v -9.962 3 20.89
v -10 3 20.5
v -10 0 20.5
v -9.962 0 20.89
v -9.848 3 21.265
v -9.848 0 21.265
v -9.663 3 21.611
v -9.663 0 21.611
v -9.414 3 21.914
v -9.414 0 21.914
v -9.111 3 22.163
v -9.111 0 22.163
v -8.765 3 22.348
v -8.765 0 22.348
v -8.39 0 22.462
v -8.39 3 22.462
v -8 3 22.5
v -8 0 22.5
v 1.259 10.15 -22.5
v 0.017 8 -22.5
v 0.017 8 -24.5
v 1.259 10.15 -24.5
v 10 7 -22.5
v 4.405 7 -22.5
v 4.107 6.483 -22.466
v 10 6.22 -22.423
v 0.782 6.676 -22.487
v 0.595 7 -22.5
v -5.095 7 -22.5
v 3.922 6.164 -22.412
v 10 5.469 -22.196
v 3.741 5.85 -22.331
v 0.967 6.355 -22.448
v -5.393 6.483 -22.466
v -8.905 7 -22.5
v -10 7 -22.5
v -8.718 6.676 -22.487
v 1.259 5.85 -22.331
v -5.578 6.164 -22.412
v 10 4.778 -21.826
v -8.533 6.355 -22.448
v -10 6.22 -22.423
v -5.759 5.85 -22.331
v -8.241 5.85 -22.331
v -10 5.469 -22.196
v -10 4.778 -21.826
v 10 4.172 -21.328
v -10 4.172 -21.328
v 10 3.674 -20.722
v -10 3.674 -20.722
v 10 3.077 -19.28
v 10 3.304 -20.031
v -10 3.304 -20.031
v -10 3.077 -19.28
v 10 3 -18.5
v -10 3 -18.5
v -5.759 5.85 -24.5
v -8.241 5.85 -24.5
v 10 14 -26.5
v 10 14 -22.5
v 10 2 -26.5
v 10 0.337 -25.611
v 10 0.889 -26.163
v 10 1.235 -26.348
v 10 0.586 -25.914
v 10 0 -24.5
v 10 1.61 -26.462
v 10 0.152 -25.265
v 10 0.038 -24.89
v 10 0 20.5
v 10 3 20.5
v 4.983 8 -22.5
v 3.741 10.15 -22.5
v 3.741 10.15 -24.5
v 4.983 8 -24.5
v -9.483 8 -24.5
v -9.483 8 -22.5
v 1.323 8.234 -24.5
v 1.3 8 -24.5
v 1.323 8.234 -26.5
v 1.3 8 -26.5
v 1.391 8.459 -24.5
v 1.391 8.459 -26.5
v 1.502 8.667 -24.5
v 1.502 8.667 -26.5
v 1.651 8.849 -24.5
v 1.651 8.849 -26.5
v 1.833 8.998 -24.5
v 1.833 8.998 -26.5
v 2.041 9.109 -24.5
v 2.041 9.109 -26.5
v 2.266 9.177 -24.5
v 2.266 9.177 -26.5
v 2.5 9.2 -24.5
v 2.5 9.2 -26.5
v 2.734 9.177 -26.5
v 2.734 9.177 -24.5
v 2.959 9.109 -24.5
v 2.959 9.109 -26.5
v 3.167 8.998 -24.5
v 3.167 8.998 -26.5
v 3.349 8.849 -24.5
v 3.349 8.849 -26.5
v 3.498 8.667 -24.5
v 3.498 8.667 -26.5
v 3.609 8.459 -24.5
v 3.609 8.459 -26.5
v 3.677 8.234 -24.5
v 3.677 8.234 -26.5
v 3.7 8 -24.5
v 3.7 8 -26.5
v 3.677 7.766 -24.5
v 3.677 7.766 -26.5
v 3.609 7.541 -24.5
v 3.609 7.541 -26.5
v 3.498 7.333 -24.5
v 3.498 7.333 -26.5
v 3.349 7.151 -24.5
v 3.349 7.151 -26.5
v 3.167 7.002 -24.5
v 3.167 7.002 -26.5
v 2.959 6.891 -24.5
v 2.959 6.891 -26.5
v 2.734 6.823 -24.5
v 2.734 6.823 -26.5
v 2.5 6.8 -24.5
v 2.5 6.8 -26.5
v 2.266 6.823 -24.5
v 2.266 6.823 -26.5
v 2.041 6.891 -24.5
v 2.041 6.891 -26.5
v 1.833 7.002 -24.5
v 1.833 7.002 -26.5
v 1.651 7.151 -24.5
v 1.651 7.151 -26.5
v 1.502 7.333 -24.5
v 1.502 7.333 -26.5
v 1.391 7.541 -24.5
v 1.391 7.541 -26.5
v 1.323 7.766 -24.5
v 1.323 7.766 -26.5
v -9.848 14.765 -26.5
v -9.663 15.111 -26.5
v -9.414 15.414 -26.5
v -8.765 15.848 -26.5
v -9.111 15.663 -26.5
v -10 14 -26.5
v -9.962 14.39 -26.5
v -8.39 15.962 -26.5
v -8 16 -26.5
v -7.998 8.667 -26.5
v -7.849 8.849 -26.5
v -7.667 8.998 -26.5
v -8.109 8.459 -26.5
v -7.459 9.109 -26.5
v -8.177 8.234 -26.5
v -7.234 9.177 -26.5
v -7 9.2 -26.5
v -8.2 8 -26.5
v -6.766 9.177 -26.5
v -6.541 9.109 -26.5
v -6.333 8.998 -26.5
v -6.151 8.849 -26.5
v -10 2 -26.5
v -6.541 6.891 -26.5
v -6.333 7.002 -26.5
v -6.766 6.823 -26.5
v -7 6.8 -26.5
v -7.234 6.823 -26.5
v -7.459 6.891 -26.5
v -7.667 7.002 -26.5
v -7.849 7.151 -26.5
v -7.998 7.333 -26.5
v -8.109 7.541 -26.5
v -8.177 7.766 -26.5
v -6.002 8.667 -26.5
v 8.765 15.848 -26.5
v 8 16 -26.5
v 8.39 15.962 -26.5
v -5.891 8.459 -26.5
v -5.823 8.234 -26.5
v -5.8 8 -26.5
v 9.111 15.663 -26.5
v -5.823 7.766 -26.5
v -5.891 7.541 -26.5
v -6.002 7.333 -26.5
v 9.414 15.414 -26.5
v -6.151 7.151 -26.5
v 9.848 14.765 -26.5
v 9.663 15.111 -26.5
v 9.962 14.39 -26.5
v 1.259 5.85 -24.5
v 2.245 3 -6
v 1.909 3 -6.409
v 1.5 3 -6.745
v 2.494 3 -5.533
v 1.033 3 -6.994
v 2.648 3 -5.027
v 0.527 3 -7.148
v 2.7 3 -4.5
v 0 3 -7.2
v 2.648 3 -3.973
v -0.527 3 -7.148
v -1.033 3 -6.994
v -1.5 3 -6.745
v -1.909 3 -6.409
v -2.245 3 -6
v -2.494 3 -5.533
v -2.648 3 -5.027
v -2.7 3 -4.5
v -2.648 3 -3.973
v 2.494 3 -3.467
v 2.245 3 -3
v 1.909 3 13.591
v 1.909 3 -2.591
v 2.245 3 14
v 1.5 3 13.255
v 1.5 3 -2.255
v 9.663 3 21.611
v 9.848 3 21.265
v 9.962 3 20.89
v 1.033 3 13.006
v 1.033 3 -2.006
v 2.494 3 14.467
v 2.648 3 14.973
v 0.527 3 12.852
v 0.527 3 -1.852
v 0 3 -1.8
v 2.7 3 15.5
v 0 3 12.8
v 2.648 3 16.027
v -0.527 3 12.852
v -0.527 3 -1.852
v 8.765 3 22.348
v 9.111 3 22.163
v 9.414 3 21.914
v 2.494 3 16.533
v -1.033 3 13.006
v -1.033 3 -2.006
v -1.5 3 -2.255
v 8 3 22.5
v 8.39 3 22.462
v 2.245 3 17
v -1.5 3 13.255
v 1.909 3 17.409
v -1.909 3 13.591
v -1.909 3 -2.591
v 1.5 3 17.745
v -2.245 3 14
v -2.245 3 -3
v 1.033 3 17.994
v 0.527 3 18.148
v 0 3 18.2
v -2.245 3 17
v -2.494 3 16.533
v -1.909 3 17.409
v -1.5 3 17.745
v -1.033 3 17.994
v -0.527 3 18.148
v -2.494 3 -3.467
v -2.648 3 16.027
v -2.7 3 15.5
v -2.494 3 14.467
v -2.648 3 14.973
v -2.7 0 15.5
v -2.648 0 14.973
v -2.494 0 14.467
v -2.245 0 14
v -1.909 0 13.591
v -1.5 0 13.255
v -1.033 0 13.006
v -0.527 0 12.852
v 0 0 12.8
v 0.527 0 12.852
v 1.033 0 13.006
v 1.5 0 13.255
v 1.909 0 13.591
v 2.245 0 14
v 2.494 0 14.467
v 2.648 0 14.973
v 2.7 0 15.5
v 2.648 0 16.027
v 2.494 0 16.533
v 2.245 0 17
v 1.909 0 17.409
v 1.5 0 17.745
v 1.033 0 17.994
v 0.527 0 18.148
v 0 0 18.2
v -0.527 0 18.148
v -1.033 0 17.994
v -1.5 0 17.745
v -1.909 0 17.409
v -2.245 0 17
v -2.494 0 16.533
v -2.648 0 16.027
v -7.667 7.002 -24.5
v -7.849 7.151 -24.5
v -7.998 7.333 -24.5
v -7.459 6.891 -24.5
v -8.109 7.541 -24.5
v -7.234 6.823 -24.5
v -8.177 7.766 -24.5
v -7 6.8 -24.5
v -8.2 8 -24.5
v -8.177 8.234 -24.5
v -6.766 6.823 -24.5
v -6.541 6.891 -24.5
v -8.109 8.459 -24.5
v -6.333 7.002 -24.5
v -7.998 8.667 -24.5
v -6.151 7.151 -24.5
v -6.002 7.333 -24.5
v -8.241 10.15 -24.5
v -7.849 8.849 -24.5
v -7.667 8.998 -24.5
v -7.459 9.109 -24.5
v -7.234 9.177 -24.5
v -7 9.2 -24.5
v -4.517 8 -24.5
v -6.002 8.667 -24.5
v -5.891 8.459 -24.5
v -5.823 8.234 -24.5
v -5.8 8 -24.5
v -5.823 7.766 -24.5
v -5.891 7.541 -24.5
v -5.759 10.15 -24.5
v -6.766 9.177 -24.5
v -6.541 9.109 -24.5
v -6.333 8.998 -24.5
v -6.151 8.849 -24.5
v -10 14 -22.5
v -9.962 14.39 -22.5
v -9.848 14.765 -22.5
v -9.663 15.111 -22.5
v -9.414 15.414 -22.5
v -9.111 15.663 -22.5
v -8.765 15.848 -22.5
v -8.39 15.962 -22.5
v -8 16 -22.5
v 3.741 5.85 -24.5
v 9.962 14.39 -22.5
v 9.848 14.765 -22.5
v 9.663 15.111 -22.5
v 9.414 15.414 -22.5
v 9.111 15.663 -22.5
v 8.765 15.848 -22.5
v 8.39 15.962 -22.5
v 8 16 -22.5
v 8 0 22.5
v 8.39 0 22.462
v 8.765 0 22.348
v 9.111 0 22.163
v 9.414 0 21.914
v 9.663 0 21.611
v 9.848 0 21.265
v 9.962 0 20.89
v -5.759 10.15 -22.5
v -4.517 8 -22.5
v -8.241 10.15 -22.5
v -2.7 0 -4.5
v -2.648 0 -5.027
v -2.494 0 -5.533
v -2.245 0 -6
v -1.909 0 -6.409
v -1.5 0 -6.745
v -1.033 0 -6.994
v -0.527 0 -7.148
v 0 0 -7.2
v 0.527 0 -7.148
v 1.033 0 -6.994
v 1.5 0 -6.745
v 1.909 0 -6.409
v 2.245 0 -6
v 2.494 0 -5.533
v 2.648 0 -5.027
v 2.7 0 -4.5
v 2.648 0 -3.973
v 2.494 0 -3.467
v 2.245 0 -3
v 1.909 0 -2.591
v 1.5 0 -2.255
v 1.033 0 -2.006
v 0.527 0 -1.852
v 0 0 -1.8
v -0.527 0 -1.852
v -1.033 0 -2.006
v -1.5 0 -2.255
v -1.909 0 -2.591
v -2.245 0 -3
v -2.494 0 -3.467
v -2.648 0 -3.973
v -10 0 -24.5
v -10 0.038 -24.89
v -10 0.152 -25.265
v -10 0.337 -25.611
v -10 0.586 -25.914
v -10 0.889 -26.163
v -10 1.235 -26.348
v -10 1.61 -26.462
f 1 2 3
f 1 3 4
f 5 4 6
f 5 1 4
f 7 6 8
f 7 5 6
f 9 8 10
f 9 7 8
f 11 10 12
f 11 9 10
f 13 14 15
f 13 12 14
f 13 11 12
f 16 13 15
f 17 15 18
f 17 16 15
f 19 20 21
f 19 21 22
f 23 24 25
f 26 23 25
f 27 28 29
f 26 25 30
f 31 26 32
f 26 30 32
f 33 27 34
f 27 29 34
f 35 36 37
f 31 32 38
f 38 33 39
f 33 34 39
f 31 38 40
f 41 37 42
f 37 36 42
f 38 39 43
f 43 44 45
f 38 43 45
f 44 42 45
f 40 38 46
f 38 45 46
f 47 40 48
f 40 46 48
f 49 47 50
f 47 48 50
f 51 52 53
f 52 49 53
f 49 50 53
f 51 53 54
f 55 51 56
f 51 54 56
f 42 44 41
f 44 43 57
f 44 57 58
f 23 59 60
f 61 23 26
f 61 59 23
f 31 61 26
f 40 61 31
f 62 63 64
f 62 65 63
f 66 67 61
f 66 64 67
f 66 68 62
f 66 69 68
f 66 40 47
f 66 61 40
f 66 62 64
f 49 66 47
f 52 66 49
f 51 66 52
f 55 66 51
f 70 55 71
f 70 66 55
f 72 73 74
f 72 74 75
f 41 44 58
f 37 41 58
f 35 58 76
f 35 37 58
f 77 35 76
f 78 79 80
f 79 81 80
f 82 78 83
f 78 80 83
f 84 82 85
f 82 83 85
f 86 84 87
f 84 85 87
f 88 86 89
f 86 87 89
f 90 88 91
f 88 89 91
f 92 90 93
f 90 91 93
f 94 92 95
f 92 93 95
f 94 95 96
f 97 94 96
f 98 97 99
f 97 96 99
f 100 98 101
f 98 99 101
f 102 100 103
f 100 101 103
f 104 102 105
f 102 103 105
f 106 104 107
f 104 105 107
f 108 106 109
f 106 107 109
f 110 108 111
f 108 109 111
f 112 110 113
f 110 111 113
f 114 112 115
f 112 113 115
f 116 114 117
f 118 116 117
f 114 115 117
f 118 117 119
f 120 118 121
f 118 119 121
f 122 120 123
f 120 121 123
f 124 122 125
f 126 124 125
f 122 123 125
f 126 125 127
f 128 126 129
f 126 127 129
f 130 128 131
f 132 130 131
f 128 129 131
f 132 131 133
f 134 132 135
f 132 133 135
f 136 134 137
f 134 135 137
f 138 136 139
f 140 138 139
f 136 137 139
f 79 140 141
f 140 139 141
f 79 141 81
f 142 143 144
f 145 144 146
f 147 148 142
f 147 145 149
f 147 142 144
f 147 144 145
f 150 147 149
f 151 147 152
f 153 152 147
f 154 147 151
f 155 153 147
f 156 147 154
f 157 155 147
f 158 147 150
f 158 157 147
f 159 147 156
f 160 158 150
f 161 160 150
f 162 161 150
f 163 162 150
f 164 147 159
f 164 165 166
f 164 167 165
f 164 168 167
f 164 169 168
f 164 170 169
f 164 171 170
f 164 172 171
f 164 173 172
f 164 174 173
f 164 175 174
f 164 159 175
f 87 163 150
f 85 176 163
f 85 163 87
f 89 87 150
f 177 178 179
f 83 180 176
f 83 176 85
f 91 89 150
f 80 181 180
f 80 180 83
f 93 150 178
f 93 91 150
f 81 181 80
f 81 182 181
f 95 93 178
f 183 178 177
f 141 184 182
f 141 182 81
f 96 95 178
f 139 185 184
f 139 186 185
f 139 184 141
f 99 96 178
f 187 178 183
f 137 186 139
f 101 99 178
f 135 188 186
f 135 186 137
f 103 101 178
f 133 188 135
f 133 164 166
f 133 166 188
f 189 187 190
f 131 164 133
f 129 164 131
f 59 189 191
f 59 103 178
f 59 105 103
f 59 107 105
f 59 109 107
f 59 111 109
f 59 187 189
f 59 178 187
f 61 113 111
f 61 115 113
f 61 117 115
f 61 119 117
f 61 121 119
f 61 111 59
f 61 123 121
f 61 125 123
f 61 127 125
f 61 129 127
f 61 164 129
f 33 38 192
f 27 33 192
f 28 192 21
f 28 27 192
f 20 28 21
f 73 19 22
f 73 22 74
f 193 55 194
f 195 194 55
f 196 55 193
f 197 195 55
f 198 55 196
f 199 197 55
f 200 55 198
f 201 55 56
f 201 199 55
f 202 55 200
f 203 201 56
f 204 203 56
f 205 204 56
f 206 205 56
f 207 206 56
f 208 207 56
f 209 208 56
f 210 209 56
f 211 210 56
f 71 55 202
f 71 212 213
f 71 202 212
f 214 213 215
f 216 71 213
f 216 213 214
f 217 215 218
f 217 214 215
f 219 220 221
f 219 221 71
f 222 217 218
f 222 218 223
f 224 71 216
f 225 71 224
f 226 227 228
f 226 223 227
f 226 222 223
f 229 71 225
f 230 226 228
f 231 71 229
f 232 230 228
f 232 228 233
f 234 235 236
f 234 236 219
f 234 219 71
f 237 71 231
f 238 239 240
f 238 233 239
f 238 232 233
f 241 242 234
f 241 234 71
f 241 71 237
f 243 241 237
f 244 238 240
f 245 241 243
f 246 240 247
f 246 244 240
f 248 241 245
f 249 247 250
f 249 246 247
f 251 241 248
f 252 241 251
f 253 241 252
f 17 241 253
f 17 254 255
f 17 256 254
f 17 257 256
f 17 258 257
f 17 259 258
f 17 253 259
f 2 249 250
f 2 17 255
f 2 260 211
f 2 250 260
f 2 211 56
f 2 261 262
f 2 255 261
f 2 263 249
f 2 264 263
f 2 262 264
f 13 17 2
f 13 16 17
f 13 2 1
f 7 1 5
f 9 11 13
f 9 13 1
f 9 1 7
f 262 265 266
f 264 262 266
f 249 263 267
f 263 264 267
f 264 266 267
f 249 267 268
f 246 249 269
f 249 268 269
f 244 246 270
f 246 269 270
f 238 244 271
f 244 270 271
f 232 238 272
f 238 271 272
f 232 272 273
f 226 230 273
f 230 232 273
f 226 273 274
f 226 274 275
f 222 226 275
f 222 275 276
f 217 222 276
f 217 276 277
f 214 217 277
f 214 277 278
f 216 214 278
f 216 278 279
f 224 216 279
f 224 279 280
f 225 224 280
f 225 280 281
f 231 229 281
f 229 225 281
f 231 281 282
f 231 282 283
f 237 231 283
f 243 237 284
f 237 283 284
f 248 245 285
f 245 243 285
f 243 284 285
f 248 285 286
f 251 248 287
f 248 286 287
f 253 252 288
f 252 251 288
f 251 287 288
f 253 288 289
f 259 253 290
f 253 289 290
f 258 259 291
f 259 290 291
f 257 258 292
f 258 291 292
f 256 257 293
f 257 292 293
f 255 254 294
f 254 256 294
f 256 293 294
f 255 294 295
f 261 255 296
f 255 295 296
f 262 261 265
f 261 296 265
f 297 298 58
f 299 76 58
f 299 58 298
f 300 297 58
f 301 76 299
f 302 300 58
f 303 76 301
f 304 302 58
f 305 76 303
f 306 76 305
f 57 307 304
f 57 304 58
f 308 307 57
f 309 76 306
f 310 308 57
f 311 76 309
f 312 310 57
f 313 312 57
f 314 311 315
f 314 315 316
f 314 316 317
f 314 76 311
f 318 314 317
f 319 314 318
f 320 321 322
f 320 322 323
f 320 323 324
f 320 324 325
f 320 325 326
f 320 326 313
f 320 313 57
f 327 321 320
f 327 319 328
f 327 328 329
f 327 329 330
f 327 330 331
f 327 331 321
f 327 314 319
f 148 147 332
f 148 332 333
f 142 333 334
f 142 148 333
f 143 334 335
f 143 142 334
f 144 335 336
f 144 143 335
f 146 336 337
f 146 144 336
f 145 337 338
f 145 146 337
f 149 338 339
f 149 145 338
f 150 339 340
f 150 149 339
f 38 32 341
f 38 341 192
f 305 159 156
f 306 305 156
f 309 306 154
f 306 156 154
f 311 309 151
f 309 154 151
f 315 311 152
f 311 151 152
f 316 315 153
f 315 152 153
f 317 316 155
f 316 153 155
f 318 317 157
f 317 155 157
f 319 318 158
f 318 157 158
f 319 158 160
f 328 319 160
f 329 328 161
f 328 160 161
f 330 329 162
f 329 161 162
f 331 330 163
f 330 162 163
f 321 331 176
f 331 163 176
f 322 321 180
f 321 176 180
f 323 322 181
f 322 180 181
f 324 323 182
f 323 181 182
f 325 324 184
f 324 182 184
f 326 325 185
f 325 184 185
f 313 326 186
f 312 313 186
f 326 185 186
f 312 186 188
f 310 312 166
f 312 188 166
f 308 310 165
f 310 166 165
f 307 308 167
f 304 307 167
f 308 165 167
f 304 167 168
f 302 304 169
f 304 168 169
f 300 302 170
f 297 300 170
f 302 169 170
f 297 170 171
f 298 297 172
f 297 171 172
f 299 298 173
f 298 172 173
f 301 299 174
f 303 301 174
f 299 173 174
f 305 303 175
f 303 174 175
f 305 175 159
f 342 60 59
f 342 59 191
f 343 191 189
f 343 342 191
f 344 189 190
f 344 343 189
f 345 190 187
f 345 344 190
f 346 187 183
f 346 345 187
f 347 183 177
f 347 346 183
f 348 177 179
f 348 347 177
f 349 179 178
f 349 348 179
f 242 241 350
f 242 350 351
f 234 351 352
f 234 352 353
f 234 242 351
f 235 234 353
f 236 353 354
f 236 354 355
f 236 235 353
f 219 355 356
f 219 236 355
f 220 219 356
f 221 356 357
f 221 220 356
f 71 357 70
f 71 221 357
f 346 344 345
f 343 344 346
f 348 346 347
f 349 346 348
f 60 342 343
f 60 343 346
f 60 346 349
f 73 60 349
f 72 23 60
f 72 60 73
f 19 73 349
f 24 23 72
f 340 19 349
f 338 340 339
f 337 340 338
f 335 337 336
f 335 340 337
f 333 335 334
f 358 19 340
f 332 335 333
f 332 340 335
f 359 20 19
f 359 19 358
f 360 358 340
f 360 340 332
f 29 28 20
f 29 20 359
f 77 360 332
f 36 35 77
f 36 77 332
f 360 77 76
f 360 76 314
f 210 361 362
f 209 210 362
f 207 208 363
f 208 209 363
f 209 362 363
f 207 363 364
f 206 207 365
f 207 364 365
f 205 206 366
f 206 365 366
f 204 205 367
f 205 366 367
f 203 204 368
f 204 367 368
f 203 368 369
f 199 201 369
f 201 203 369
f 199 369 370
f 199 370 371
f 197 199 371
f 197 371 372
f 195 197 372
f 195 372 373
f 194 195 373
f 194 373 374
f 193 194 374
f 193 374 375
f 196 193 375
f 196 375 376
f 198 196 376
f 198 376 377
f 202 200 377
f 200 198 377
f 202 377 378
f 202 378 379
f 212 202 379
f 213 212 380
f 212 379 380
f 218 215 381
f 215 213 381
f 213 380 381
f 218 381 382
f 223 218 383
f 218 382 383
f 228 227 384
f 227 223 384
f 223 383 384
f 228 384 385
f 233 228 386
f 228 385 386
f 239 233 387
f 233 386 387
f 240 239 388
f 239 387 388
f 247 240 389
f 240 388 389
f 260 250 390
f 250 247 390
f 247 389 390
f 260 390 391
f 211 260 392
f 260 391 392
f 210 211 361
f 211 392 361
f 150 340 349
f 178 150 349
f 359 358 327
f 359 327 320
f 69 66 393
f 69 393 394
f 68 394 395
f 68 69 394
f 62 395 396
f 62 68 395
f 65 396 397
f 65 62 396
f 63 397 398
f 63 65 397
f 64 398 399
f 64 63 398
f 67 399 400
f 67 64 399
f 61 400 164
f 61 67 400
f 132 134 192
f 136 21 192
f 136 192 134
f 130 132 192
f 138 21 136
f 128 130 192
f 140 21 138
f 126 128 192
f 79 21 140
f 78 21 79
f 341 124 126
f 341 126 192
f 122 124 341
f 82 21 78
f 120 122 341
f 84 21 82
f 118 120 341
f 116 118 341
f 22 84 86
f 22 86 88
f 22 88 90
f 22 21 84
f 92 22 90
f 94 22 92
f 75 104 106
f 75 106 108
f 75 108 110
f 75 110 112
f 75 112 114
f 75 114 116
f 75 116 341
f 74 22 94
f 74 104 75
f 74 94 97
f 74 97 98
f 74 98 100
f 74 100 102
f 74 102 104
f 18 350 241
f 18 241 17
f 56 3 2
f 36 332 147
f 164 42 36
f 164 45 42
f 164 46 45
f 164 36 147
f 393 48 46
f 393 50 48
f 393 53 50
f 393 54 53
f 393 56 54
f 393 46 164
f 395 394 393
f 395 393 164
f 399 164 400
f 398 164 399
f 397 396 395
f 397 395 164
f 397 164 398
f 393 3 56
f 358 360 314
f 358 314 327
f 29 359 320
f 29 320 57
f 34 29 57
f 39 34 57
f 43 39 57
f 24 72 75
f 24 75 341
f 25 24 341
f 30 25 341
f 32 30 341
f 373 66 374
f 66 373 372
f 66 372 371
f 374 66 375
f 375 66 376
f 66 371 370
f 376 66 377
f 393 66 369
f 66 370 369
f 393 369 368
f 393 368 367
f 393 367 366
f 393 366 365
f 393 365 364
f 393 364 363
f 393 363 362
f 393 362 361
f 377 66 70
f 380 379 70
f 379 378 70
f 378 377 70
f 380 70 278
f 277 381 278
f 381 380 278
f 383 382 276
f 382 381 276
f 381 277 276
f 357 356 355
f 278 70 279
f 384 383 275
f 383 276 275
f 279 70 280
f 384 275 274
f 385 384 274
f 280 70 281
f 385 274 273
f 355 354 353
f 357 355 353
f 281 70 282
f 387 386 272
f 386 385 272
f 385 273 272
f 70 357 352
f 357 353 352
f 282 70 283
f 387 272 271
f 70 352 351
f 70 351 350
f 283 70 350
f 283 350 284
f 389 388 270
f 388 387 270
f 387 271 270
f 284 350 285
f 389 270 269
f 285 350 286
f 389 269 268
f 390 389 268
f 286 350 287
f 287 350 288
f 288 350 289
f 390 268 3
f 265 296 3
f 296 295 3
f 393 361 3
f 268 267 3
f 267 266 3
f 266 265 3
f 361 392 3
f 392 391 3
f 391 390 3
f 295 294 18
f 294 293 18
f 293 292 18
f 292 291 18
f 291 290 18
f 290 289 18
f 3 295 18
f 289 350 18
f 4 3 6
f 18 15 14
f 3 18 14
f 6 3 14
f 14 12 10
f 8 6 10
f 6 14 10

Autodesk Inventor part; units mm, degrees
ref_plane "YZ Plane" through (0, 0, 0) normal (1, 0, 0) x (0, 1, 0)
ref_plane "XZ Plane" through (0, 0, 0) normal (0, 1, 0) x (-1, 0, 0)
ref_plane "XY Plane" through (0, 0, 0) normal (0, 0, 1) x (1, 0, 0)
sketch "Boceto1" plane through (0, 0, 0) normal (0, 1, 0) x (-1, 0, 0)
  line L0 (-10, 22.5) -> (10, 22.5)
  line L1 (10, 22.5) -> (10, -22.5)
  line L2 (10, -22.5) -> (-10, -22.5)
  line L3 (-10, -22.5) -> (-10, 22.5)
  line L4 (-10, 22.5) -> (10, -22.5) construction
  line L5 (10, 22.5) -> (-10, -22.5) construction
  circle A0 centre (0, 15.5) radius 2.7
  circle A1 centre (0, -4.5) radius 2.7
  point P0 (0, 0)
  point P1 (0, 0)
  dimension "d0" = 5.4
  dimension "d1" = 5.4
  dimension "d2" = 45
  dimension "d3" = 20
  dimension "d21" = 20
  dimension "d22" = 7
extrude "Extrusión1" add sketch "Boceto1" along normal blind 3
sketch "Boceto2" plane through (0, 0, 0) normal (0, -1, 0) x (1, 0, 0)
  line L0 (10, -22.5) -> (-10, -22.5) projected
  line L1 (10, -22.5) -> (-10, -22.5)
  line L2 (-10, -22.5) -> (-10, -26.5)
  line L3 (-10, -26.5) -> (10, -26.5)
  line L4 (10, -26.5) -> (10, -22.5)
  line L5 (-10, -22.5) -> (-10, 22.5) projected
  point P0 (0, 0)
  dimension "d8" = 4
extrude "Extrusión2" add sketch "Boceto2" against normal blind 16
sketch "Boceto3" plane through (10, 0, -26.5) normal (0, 0, -1) x (-1, 0, 0)
  circle A0 centre (7.5, 8) radius 1.2
  circle A1 centre (17, 8) radius 1.2
  line L0 (20, 0) -> (20, 16) projected
  line L1 (0, 16) -> (20, 16) projected
  point P0 (10, 0)
  dimension "d11" = 9.5
  dimension "d12" = 2.4
  dimension "d13" = 3
  dimension "d16" = 8
extrude "Extrusión3" cut sketch "Boceto3" against normal blind 20
sketch "Boceto4" plane through (-10, 3, -22.5) normal (0, 0, 1) x (1, 0, 0)
  circle A0 centre (12.5, 5) radius 1.2 projected
  line L0 (14.9826, 5) -> (13.7413, 2.85)
  line L1 (13.7413, 2.85) -> (11.2587, 2.85)
  line L2 (11.2587, 2.85) -> (10.0174, 5)
  line L3 (10.0174, 5) -> (11.2587, 7.15)
  line L4 (11.2587, 7.15) -> (13.7413, 7.15)
  line L5 (13.7413, 7.15) -> (14.9826, 5)
  circle A1 centre (3, 5) radius 1.2 projected
  line L6 (5.4826, 5) -> (4.2413, 2.85)
  line L7 (4.2413, 2.85) -> (1.7587, 2.85)
  line L8 (1.7587, 2.85) -> (0.5174, 5)
  line L9 (0.5174, 5) -> (1.7587, 7.15)
  line L10 (1.7587, 7.15) -> (4.2413, 7.15)
  line L11 (4.2413, 7.15) -> (5.4826, 5)
  circle A2 centre (12.5, 5) radius 2.15
  circle A3 centre (3, 5) radius 2.15
  point P0 (10, -3)
  dimension "d17" = 4.3
extrude "Extrusión4" cut sketch "Boceto4" against normal blind 2 contours A0 | L0 A2 L5 | L0 L1 A2 | A2 | A2 L4 L5 | L1 L2 A2 | A2 L3 L4 | L2 L3 A2 | A1 | L6 A3 L11 | L6 L7 A3 | A3 | A3 L10 L11 | L7 L8 A3 | A3 L9 L10 | L8 L9 A3
fillet "Empalme1" radius 2 2 edges at (-10, 1.5, 22.5) (10, 1.5, 22.5)
fillet "Empalme2" radius 2 2 edges at (-10, 16, -24.5) (10, 16, -24.5)
fillet "Empalme3" radius 2 1 edges at (0, 0, -26.5)
fillet "Empalme4" radius 4 1 edges at (0, 3, -22.5)
properties part number "zupportenstop"
